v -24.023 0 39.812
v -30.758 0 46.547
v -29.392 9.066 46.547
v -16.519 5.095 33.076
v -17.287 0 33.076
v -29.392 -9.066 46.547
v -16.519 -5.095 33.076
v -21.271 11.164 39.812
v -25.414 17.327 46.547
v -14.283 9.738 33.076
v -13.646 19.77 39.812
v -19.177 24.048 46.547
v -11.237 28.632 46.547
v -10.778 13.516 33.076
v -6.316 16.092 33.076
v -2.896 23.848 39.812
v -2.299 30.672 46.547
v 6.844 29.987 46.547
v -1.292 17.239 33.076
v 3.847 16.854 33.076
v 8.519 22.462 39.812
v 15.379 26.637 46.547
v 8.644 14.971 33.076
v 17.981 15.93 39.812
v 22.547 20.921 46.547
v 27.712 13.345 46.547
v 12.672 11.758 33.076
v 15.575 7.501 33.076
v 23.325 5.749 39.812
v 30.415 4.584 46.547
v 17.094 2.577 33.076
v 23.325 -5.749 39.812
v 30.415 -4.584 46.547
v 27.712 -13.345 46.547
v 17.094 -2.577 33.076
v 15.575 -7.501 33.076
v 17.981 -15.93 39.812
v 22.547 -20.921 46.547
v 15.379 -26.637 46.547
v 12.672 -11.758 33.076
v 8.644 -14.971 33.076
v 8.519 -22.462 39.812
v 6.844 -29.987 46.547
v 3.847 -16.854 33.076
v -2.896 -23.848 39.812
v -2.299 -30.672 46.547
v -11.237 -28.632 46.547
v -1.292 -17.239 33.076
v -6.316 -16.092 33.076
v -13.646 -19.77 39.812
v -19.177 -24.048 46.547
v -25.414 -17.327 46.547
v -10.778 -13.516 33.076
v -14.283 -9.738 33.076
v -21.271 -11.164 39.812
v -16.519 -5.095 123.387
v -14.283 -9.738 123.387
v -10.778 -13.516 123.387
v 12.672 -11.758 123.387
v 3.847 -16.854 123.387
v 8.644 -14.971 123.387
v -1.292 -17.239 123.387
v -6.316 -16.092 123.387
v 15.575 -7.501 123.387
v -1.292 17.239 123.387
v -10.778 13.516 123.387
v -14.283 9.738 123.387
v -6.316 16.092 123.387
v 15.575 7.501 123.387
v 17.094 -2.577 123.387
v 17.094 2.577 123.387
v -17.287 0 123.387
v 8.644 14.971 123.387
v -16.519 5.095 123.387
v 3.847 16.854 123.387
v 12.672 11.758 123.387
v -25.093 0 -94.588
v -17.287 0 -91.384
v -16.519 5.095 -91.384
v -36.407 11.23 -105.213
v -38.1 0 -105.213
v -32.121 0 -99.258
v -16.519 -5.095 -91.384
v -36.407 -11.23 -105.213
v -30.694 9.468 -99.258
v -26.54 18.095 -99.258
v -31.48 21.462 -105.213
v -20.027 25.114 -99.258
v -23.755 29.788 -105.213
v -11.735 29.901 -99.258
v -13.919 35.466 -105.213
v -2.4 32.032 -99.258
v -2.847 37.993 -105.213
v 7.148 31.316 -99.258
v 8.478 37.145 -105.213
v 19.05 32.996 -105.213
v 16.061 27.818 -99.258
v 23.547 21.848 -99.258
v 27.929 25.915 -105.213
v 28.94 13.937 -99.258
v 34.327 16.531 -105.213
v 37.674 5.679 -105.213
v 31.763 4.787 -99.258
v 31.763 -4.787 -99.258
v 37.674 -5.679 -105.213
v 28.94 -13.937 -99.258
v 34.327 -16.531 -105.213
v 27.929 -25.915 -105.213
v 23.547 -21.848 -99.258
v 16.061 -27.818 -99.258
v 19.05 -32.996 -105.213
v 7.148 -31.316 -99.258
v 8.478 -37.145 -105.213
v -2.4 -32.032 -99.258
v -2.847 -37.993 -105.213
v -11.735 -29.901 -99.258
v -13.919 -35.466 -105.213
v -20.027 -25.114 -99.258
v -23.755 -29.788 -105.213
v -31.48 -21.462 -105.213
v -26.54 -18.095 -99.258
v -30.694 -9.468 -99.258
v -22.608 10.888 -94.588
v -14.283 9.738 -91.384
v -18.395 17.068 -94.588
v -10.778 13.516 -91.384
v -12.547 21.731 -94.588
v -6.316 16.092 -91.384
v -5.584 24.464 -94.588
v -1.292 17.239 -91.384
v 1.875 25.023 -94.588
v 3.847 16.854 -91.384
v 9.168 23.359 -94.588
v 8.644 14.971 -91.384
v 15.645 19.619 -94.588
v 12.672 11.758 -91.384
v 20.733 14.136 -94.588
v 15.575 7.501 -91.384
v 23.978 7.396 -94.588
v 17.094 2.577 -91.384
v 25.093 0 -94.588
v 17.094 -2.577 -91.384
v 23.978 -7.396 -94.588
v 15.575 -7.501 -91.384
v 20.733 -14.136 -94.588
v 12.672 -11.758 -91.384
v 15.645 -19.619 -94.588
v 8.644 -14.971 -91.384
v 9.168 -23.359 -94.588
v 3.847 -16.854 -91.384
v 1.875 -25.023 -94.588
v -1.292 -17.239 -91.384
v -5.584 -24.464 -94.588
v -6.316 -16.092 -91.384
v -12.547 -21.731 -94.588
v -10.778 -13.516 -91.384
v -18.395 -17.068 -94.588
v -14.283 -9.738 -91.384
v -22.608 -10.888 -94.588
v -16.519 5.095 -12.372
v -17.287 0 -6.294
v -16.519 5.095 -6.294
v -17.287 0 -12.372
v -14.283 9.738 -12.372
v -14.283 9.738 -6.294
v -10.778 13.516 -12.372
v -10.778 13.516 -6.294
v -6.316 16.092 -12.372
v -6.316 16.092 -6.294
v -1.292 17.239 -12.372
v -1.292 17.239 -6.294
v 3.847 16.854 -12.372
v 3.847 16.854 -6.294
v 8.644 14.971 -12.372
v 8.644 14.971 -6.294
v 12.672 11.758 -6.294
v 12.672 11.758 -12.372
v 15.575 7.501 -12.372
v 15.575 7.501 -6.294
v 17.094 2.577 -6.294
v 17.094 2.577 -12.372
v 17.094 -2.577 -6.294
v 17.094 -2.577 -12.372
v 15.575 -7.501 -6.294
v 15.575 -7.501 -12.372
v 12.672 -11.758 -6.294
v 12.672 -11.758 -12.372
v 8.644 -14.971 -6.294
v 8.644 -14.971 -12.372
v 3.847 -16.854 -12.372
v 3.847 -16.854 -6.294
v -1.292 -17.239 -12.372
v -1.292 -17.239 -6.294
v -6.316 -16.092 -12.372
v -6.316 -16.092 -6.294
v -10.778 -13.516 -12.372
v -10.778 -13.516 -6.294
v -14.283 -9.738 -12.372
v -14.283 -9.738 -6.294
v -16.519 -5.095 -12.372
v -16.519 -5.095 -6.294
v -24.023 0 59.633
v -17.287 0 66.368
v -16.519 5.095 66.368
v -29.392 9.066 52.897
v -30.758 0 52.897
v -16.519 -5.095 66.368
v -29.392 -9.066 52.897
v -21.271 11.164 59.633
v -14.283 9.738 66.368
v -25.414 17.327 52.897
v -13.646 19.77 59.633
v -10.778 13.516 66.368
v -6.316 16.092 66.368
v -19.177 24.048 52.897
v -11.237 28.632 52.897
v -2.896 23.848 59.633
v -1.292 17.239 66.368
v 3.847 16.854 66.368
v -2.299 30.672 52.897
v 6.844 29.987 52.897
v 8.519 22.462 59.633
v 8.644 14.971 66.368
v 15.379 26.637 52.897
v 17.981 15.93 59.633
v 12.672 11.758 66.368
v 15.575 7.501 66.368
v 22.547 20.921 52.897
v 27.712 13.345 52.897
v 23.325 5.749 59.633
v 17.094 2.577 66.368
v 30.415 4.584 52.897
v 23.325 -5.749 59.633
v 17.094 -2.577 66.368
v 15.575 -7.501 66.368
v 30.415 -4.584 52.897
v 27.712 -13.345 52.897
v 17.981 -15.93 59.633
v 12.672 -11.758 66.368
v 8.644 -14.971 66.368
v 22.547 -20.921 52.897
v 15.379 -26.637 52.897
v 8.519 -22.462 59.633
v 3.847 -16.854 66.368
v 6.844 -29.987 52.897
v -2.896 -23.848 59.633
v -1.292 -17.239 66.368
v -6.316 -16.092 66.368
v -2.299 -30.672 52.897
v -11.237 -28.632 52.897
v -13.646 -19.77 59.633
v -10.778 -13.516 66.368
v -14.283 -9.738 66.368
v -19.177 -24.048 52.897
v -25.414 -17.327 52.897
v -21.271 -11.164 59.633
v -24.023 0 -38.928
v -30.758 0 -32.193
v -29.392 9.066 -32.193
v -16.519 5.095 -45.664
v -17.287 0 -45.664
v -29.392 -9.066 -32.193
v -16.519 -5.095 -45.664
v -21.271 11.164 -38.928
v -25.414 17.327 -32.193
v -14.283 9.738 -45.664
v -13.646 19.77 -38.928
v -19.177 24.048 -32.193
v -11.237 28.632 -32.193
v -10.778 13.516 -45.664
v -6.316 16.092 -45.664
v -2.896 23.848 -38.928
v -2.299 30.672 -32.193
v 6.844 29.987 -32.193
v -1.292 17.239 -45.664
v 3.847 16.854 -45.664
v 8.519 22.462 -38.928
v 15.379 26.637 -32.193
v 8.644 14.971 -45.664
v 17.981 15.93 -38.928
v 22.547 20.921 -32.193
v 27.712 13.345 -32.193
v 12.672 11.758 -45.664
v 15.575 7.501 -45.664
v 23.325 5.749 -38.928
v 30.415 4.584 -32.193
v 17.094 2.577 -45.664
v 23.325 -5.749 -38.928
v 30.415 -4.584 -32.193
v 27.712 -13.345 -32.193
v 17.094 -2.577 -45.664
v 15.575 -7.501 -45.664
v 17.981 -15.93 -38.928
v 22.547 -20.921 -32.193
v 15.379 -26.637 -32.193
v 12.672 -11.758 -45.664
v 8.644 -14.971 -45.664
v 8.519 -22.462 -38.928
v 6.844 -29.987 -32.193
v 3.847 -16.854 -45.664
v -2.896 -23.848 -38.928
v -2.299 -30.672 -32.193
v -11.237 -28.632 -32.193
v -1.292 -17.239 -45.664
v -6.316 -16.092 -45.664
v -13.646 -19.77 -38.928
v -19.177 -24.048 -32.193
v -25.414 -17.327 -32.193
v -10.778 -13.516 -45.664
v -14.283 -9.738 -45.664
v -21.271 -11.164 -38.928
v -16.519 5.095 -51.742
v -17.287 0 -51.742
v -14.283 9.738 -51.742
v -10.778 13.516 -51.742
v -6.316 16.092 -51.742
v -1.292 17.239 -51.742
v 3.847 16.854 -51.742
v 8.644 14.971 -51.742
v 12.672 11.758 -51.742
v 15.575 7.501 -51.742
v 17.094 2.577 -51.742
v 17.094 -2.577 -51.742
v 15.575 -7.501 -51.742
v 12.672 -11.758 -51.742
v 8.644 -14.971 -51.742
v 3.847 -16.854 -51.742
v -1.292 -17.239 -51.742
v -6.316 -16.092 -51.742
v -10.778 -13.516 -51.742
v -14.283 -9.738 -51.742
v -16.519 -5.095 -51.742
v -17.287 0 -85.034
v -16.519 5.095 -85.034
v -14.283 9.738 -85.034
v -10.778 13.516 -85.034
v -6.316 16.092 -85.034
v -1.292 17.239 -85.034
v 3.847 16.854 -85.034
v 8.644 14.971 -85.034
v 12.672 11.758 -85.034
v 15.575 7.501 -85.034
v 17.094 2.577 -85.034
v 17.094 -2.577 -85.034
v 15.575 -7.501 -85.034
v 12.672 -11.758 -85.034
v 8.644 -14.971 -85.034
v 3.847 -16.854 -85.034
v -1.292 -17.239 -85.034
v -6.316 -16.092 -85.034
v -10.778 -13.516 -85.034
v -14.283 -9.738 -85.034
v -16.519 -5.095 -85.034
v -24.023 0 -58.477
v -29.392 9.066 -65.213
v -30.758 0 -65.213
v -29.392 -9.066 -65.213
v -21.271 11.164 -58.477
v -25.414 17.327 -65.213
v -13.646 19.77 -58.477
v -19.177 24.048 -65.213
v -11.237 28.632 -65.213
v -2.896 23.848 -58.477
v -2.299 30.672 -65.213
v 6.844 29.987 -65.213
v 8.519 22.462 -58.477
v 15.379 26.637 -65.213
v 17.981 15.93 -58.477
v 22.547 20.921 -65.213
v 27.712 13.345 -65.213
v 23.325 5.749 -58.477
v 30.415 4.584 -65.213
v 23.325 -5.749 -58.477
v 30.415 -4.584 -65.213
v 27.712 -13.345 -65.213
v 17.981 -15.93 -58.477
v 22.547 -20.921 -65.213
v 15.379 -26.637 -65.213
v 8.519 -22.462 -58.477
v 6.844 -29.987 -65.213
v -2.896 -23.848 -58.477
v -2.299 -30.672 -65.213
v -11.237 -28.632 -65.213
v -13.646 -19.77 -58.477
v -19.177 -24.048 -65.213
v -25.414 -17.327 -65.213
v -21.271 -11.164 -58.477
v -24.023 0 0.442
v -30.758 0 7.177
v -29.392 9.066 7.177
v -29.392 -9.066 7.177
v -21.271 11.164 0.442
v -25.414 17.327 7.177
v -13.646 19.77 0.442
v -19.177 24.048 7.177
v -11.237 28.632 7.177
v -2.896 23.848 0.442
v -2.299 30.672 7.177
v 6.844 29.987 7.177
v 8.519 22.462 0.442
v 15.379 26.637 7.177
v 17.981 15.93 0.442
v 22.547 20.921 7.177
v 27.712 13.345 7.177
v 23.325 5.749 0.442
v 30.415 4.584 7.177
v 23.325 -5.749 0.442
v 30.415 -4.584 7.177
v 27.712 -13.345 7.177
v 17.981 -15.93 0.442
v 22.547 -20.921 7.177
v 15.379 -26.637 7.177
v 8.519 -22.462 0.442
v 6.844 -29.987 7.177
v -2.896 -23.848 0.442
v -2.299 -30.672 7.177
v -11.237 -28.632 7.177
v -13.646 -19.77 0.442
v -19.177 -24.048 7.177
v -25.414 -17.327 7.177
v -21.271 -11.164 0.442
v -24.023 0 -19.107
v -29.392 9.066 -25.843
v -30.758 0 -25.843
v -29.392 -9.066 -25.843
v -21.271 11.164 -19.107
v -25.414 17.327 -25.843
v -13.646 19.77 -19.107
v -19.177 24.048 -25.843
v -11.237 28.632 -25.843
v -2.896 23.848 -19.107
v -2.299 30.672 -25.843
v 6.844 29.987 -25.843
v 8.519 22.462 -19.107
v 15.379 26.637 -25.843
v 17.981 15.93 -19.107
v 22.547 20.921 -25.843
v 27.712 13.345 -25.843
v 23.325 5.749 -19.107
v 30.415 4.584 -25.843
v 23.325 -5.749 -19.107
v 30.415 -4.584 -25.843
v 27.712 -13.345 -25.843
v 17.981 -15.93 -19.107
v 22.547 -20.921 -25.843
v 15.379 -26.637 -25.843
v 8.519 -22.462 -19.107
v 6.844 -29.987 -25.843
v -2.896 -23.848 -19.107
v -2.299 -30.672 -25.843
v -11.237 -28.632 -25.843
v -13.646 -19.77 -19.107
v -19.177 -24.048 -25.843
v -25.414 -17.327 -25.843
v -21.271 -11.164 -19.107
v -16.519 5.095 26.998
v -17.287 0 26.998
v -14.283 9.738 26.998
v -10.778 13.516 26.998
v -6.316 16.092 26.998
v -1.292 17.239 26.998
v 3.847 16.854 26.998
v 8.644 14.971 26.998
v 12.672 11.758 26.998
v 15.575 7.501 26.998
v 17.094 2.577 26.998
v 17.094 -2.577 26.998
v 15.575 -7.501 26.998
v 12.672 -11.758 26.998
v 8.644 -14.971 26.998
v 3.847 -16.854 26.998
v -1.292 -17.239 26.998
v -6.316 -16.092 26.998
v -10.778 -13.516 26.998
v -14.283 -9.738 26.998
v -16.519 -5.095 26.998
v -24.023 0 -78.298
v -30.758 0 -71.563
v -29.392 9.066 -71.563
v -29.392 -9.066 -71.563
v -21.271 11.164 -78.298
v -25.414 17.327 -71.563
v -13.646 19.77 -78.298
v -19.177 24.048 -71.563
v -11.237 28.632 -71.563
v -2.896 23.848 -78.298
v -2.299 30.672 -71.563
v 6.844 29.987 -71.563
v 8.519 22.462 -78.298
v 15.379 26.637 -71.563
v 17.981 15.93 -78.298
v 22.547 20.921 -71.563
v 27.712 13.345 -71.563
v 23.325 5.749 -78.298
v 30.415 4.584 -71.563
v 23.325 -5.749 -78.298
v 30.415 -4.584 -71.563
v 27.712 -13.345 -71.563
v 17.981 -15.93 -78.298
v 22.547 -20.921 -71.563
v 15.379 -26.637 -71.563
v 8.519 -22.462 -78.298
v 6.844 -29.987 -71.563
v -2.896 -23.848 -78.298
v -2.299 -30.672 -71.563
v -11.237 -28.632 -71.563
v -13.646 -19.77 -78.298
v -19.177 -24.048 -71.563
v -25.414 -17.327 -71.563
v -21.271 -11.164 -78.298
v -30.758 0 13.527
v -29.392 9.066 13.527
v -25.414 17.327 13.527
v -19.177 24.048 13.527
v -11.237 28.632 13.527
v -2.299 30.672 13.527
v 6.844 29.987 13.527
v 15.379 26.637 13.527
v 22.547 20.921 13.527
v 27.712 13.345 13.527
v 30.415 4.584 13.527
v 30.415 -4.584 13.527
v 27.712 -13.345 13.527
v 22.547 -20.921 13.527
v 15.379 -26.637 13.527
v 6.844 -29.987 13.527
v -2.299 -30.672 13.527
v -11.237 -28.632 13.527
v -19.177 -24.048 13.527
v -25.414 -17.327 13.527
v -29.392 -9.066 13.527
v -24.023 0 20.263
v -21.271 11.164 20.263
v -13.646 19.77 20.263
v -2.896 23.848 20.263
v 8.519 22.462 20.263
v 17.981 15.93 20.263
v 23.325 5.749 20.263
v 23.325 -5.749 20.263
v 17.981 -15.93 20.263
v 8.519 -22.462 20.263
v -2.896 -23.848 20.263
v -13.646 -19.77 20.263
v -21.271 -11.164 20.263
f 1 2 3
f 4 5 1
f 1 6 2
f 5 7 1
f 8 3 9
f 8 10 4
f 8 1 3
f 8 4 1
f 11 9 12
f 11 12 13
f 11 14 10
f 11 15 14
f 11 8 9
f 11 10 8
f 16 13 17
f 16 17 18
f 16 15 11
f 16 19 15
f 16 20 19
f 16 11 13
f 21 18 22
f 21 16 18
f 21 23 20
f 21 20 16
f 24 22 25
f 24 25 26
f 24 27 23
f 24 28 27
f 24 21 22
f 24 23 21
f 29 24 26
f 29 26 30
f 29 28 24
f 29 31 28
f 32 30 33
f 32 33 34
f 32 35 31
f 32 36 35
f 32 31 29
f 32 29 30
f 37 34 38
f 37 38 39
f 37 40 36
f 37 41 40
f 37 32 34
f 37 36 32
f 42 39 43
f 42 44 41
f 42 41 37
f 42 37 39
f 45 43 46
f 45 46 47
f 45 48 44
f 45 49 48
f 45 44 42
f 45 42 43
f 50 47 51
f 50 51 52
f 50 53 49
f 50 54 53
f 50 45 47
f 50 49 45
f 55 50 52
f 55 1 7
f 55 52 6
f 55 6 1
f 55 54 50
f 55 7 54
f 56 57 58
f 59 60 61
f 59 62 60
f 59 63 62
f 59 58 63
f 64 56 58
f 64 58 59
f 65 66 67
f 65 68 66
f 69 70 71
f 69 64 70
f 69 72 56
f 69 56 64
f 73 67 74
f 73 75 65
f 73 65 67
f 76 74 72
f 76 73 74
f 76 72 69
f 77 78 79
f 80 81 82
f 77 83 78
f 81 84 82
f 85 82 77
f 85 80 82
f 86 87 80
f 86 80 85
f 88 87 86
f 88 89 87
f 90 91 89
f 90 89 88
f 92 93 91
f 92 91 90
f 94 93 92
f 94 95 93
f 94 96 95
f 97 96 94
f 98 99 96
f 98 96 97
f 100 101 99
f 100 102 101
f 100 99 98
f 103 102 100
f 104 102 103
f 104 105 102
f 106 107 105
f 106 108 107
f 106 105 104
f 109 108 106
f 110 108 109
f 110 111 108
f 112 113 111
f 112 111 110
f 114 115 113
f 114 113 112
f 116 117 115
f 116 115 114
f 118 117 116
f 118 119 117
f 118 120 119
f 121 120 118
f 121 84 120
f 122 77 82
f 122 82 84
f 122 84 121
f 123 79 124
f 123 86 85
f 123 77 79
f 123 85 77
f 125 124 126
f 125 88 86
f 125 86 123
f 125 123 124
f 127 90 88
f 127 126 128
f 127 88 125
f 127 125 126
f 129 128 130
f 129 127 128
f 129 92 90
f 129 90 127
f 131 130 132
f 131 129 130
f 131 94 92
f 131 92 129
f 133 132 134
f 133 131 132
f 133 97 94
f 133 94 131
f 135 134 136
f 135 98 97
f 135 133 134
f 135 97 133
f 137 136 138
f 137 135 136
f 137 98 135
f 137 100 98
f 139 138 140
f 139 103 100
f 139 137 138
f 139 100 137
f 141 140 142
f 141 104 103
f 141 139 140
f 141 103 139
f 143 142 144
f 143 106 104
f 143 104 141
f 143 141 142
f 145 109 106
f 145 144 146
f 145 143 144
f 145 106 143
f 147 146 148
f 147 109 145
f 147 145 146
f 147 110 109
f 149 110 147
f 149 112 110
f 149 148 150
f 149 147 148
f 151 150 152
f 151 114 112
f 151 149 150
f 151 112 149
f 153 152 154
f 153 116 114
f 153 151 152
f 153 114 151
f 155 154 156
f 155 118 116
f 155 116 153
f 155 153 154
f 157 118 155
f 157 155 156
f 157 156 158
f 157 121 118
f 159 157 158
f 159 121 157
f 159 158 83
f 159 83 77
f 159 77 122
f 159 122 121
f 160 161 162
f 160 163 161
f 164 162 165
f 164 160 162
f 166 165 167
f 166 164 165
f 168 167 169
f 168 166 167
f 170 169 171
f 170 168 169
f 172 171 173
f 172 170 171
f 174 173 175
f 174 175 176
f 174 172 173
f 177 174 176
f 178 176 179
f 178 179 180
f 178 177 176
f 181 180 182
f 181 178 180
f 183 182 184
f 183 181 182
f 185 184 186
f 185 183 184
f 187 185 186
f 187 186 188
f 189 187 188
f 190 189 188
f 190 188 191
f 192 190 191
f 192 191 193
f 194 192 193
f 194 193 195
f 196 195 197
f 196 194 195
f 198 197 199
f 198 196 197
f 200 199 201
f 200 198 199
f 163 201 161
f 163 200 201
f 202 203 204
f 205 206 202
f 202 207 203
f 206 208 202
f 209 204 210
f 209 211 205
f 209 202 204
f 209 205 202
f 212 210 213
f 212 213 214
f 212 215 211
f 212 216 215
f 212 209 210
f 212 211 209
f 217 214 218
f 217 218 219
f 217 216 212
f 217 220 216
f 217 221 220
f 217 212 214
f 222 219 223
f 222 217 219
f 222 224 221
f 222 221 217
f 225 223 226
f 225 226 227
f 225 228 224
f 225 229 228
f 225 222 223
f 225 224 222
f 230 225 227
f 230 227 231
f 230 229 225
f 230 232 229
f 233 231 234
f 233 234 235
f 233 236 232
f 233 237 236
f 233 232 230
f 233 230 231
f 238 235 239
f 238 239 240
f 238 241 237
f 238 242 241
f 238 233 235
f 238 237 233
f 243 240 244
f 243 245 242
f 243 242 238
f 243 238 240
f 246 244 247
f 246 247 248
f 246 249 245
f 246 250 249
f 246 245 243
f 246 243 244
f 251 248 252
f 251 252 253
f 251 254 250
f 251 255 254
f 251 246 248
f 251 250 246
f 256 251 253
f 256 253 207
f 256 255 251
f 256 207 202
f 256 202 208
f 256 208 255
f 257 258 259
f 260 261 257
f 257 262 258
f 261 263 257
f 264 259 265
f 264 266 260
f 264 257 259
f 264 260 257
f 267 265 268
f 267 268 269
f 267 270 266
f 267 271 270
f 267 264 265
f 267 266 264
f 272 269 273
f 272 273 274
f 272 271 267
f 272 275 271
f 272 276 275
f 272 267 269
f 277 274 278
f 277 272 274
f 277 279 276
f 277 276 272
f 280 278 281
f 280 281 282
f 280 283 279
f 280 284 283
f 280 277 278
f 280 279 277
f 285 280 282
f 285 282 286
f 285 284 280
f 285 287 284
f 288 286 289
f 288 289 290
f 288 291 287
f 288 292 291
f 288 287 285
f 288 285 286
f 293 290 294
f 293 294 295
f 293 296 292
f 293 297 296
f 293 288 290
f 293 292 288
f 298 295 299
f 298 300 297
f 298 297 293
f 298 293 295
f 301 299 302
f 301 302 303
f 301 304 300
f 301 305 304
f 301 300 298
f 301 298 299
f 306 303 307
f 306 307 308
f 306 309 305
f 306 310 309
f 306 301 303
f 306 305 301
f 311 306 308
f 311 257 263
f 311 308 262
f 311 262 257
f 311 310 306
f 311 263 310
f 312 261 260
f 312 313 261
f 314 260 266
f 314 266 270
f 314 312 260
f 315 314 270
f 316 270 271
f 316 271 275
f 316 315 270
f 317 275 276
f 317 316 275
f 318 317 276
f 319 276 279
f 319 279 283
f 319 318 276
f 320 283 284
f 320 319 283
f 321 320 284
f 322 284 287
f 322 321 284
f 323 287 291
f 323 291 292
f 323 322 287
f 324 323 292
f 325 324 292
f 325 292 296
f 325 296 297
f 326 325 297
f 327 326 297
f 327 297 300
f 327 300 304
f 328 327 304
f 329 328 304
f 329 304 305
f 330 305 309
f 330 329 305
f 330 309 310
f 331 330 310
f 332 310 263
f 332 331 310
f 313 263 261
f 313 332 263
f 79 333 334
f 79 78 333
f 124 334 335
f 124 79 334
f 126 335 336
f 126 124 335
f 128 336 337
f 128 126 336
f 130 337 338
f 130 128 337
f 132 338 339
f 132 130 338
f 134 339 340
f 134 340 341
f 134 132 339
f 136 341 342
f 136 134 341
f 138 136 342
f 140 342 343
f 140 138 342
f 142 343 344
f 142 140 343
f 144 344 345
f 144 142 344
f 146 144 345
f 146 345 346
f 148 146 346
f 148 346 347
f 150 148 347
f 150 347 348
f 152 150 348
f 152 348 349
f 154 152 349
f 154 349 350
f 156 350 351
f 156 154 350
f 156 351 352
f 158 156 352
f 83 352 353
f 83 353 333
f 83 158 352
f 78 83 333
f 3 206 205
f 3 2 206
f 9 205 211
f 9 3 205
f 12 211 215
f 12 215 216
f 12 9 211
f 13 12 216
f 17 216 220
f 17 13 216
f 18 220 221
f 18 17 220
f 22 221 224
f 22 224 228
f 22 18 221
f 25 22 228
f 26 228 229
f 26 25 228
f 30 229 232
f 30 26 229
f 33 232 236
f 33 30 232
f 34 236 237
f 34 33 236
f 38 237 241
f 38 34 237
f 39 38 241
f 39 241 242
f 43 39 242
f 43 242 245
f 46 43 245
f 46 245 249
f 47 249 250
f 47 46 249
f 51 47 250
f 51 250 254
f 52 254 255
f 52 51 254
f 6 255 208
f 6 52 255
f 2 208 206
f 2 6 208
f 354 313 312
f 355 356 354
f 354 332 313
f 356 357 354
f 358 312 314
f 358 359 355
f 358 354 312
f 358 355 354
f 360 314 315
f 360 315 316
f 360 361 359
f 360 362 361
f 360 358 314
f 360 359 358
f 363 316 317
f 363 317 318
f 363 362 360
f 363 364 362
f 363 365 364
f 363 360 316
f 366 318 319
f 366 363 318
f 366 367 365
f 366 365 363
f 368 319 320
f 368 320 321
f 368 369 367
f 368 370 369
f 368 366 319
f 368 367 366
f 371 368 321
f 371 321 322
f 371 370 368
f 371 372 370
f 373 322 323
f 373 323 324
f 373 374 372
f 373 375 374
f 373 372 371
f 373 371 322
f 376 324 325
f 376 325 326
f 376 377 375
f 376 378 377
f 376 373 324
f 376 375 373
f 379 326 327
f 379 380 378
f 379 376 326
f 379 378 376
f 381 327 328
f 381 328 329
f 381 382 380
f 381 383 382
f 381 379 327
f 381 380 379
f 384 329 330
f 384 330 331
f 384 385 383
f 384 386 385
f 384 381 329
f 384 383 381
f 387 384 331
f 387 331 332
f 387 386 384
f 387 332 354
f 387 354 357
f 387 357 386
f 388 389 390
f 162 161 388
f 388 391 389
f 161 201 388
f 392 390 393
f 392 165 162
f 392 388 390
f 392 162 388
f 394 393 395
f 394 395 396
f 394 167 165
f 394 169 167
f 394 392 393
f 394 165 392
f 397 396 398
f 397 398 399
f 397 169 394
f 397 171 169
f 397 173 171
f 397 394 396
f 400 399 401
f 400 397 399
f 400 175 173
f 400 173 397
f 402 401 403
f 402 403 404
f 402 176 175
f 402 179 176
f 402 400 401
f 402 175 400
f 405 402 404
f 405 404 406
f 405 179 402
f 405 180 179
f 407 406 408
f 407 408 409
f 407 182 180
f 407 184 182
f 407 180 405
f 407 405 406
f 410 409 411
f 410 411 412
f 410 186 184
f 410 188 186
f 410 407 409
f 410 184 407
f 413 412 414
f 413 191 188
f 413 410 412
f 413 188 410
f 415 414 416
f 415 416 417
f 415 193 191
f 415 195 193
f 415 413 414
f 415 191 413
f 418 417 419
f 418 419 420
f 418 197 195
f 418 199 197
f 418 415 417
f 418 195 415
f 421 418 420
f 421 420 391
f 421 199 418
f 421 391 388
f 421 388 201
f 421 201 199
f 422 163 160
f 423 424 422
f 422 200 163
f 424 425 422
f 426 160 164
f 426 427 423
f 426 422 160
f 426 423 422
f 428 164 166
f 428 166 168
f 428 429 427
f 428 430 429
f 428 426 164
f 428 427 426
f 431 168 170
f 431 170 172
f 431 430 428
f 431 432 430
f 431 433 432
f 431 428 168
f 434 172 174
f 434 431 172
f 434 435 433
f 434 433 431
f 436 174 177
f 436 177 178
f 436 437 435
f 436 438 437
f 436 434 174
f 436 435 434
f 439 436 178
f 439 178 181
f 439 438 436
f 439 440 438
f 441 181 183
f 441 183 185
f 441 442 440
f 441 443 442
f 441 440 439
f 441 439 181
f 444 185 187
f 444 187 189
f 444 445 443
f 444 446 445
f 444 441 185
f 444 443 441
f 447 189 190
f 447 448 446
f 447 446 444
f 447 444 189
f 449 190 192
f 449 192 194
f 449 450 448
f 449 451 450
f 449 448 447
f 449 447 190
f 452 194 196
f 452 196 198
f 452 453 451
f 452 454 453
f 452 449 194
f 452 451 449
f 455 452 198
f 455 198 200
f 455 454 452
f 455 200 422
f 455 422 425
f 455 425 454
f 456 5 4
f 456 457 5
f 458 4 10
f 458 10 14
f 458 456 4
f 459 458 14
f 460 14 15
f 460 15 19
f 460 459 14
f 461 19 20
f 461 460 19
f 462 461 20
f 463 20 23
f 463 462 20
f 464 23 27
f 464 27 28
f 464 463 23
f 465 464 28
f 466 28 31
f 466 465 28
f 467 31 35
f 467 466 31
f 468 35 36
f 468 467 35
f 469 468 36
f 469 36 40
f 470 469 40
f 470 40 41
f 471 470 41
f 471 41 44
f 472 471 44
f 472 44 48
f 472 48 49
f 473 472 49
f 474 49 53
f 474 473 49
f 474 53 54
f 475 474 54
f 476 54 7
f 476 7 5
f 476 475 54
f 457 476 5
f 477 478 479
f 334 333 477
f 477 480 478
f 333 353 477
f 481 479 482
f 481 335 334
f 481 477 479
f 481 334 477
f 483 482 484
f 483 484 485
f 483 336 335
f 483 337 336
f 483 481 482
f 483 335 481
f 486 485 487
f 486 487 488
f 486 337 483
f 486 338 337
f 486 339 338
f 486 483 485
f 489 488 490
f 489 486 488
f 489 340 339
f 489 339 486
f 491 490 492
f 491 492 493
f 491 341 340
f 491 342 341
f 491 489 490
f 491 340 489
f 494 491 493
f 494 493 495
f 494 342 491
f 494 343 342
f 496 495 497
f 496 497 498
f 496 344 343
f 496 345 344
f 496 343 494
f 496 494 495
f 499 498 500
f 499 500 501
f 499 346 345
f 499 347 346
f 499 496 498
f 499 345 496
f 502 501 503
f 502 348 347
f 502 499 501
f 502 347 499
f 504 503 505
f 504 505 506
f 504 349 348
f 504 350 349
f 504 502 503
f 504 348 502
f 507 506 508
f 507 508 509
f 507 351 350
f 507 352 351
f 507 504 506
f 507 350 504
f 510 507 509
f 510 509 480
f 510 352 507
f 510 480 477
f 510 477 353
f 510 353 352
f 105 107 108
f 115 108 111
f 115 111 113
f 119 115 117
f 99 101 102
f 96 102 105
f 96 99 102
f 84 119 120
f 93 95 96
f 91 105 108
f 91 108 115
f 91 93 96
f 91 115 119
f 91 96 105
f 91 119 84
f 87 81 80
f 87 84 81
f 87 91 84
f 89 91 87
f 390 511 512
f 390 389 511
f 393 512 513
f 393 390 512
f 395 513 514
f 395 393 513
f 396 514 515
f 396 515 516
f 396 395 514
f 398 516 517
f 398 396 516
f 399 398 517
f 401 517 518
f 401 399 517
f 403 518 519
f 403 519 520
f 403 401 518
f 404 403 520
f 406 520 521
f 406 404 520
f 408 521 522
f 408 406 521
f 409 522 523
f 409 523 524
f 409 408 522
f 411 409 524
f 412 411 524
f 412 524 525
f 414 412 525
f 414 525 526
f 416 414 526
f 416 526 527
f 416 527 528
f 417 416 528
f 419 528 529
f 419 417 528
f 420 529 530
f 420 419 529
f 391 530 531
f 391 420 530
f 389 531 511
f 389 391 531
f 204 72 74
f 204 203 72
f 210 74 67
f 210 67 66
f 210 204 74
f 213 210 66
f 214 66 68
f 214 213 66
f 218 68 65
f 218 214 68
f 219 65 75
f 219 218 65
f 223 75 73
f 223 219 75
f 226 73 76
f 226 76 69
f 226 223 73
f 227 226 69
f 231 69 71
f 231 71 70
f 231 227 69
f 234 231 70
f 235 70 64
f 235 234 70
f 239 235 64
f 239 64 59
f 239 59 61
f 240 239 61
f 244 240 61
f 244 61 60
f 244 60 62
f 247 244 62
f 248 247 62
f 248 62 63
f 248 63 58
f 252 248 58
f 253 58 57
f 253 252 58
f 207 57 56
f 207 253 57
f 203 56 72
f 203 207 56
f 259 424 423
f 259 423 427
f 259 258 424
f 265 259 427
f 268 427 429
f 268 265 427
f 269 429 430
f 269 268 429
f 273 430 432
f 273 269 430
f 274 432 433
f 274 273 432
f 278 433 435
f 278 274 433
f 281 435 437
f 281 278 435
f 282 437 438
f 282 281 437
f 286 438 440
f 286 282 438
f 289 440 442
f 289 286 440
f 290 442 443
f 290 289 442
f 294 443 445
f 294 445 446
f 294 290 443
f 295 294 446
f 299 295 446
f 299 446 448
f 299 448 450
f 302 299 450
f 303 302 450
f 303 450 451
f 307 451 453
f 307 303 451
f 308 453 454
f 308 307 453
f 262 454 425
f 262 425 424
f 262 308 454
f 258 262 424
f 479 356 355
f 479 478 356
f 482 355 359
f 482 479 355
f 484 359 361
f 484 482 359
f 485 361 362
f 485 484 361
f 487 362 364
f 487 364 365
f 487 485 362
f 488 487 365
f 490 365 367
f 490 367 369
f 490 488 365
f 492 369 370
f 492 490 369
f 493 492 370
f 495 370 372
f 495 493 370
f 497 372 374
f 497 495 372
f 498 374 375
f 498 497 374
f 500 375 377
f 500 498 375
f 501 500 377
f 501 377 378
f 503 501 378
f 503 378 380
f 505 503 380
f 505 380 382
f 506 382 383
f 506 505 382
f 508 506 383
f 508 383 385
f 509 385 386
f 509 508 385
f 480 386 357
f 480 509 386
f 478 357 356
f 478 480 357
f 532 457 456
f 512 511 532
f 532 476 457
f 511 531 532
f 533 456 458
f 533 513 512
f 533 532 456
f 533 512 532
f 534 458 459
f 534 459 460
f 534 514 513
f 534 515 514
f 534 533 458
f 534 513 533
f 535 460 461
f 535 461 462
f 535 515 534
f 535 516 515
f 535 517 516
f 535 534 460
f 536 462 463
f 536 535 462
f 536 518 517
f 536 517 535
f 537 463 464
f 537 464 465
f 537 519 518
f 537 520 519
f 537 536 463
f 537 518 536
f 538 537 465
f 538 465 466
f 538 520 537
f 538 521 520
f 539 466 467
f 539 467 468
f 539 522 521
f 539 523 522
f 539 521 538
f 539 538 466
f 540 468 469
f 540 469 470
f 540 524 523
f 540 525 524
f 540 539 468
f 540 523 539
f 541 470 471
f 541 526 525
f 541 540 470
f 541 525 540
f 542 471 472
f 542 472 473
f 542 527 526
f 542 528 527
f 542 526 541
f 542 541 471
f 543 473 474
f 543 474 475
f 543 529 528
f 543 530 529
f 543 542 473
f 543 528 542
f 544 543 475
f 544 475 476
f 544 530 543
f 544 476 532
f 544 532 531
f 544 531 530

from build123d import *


with BuildPart() as f1:
    # F0 (on Front) → F1 (revolve)
    with BuildSketch(Plane.XZ):
        with BuildLine():
            Line((0, -105.212546), (0, 123.387454))
            Line((0, 123.387454), (-17.287159, 123.387454))
            Line((-17.287159, 123.387454), (-17.287159, 72.718156))
            Line((-17.287159, 72.718156), (-17.287159, 66.368156))
            Line((-17.287159, 66.368156), (-30.758225, 52.89709))
            Line((-30.758225, 52.89709), (-30.758225, 46.54709))
            Line((-30.758225, 46.54709), (-17.287159, 33.076024))
            Line((-17.287159, 33.076024), (-17.287159, 26.998156))
            Line((-17.287159, 26.998156), (-30.758225, 13.52709))
            Line((-30.758225, 13.52709), (-30.758225, 7.17709))
            Line((-30.758225, 7.17709), (-17.287159, -6.293976))
            Line((-17.287159, -6.293976), (-17.287159, -12.371844))
            Line((-17.287159, -12.371844), (-30.758225, -25.84291))
            Line((-30.758225, -25.84291), (-30.758225, -32.19291))
            Line((-30.758225, -32.19291), (-17.287159, -45.663976))
            Line((-17.287159, -45.663976), (-17.287159, -51.741844))
            Line((-17.287159, -51.741844), (-30.758225, -65.21291))
            Line((-30.758225, -65.21291), (-30.758225, -71.56291))
            Line((-30.758225, -71.56291), (-17.287159, -85.033976))
            Line((-17.287159, -85.033976), (-17.287159, -91.383976))
            ThreePointArc((-17.287159, -91.383976), (-28.722438, -96.749767), (-38.1, -105.212546))
            Line((-38.1, -105.212546), (0, -105.212546))
        make_face()
    revolve(axis=Axis((0, 0, 9.087454), (0, 0, -1)))


solid = f1.part
